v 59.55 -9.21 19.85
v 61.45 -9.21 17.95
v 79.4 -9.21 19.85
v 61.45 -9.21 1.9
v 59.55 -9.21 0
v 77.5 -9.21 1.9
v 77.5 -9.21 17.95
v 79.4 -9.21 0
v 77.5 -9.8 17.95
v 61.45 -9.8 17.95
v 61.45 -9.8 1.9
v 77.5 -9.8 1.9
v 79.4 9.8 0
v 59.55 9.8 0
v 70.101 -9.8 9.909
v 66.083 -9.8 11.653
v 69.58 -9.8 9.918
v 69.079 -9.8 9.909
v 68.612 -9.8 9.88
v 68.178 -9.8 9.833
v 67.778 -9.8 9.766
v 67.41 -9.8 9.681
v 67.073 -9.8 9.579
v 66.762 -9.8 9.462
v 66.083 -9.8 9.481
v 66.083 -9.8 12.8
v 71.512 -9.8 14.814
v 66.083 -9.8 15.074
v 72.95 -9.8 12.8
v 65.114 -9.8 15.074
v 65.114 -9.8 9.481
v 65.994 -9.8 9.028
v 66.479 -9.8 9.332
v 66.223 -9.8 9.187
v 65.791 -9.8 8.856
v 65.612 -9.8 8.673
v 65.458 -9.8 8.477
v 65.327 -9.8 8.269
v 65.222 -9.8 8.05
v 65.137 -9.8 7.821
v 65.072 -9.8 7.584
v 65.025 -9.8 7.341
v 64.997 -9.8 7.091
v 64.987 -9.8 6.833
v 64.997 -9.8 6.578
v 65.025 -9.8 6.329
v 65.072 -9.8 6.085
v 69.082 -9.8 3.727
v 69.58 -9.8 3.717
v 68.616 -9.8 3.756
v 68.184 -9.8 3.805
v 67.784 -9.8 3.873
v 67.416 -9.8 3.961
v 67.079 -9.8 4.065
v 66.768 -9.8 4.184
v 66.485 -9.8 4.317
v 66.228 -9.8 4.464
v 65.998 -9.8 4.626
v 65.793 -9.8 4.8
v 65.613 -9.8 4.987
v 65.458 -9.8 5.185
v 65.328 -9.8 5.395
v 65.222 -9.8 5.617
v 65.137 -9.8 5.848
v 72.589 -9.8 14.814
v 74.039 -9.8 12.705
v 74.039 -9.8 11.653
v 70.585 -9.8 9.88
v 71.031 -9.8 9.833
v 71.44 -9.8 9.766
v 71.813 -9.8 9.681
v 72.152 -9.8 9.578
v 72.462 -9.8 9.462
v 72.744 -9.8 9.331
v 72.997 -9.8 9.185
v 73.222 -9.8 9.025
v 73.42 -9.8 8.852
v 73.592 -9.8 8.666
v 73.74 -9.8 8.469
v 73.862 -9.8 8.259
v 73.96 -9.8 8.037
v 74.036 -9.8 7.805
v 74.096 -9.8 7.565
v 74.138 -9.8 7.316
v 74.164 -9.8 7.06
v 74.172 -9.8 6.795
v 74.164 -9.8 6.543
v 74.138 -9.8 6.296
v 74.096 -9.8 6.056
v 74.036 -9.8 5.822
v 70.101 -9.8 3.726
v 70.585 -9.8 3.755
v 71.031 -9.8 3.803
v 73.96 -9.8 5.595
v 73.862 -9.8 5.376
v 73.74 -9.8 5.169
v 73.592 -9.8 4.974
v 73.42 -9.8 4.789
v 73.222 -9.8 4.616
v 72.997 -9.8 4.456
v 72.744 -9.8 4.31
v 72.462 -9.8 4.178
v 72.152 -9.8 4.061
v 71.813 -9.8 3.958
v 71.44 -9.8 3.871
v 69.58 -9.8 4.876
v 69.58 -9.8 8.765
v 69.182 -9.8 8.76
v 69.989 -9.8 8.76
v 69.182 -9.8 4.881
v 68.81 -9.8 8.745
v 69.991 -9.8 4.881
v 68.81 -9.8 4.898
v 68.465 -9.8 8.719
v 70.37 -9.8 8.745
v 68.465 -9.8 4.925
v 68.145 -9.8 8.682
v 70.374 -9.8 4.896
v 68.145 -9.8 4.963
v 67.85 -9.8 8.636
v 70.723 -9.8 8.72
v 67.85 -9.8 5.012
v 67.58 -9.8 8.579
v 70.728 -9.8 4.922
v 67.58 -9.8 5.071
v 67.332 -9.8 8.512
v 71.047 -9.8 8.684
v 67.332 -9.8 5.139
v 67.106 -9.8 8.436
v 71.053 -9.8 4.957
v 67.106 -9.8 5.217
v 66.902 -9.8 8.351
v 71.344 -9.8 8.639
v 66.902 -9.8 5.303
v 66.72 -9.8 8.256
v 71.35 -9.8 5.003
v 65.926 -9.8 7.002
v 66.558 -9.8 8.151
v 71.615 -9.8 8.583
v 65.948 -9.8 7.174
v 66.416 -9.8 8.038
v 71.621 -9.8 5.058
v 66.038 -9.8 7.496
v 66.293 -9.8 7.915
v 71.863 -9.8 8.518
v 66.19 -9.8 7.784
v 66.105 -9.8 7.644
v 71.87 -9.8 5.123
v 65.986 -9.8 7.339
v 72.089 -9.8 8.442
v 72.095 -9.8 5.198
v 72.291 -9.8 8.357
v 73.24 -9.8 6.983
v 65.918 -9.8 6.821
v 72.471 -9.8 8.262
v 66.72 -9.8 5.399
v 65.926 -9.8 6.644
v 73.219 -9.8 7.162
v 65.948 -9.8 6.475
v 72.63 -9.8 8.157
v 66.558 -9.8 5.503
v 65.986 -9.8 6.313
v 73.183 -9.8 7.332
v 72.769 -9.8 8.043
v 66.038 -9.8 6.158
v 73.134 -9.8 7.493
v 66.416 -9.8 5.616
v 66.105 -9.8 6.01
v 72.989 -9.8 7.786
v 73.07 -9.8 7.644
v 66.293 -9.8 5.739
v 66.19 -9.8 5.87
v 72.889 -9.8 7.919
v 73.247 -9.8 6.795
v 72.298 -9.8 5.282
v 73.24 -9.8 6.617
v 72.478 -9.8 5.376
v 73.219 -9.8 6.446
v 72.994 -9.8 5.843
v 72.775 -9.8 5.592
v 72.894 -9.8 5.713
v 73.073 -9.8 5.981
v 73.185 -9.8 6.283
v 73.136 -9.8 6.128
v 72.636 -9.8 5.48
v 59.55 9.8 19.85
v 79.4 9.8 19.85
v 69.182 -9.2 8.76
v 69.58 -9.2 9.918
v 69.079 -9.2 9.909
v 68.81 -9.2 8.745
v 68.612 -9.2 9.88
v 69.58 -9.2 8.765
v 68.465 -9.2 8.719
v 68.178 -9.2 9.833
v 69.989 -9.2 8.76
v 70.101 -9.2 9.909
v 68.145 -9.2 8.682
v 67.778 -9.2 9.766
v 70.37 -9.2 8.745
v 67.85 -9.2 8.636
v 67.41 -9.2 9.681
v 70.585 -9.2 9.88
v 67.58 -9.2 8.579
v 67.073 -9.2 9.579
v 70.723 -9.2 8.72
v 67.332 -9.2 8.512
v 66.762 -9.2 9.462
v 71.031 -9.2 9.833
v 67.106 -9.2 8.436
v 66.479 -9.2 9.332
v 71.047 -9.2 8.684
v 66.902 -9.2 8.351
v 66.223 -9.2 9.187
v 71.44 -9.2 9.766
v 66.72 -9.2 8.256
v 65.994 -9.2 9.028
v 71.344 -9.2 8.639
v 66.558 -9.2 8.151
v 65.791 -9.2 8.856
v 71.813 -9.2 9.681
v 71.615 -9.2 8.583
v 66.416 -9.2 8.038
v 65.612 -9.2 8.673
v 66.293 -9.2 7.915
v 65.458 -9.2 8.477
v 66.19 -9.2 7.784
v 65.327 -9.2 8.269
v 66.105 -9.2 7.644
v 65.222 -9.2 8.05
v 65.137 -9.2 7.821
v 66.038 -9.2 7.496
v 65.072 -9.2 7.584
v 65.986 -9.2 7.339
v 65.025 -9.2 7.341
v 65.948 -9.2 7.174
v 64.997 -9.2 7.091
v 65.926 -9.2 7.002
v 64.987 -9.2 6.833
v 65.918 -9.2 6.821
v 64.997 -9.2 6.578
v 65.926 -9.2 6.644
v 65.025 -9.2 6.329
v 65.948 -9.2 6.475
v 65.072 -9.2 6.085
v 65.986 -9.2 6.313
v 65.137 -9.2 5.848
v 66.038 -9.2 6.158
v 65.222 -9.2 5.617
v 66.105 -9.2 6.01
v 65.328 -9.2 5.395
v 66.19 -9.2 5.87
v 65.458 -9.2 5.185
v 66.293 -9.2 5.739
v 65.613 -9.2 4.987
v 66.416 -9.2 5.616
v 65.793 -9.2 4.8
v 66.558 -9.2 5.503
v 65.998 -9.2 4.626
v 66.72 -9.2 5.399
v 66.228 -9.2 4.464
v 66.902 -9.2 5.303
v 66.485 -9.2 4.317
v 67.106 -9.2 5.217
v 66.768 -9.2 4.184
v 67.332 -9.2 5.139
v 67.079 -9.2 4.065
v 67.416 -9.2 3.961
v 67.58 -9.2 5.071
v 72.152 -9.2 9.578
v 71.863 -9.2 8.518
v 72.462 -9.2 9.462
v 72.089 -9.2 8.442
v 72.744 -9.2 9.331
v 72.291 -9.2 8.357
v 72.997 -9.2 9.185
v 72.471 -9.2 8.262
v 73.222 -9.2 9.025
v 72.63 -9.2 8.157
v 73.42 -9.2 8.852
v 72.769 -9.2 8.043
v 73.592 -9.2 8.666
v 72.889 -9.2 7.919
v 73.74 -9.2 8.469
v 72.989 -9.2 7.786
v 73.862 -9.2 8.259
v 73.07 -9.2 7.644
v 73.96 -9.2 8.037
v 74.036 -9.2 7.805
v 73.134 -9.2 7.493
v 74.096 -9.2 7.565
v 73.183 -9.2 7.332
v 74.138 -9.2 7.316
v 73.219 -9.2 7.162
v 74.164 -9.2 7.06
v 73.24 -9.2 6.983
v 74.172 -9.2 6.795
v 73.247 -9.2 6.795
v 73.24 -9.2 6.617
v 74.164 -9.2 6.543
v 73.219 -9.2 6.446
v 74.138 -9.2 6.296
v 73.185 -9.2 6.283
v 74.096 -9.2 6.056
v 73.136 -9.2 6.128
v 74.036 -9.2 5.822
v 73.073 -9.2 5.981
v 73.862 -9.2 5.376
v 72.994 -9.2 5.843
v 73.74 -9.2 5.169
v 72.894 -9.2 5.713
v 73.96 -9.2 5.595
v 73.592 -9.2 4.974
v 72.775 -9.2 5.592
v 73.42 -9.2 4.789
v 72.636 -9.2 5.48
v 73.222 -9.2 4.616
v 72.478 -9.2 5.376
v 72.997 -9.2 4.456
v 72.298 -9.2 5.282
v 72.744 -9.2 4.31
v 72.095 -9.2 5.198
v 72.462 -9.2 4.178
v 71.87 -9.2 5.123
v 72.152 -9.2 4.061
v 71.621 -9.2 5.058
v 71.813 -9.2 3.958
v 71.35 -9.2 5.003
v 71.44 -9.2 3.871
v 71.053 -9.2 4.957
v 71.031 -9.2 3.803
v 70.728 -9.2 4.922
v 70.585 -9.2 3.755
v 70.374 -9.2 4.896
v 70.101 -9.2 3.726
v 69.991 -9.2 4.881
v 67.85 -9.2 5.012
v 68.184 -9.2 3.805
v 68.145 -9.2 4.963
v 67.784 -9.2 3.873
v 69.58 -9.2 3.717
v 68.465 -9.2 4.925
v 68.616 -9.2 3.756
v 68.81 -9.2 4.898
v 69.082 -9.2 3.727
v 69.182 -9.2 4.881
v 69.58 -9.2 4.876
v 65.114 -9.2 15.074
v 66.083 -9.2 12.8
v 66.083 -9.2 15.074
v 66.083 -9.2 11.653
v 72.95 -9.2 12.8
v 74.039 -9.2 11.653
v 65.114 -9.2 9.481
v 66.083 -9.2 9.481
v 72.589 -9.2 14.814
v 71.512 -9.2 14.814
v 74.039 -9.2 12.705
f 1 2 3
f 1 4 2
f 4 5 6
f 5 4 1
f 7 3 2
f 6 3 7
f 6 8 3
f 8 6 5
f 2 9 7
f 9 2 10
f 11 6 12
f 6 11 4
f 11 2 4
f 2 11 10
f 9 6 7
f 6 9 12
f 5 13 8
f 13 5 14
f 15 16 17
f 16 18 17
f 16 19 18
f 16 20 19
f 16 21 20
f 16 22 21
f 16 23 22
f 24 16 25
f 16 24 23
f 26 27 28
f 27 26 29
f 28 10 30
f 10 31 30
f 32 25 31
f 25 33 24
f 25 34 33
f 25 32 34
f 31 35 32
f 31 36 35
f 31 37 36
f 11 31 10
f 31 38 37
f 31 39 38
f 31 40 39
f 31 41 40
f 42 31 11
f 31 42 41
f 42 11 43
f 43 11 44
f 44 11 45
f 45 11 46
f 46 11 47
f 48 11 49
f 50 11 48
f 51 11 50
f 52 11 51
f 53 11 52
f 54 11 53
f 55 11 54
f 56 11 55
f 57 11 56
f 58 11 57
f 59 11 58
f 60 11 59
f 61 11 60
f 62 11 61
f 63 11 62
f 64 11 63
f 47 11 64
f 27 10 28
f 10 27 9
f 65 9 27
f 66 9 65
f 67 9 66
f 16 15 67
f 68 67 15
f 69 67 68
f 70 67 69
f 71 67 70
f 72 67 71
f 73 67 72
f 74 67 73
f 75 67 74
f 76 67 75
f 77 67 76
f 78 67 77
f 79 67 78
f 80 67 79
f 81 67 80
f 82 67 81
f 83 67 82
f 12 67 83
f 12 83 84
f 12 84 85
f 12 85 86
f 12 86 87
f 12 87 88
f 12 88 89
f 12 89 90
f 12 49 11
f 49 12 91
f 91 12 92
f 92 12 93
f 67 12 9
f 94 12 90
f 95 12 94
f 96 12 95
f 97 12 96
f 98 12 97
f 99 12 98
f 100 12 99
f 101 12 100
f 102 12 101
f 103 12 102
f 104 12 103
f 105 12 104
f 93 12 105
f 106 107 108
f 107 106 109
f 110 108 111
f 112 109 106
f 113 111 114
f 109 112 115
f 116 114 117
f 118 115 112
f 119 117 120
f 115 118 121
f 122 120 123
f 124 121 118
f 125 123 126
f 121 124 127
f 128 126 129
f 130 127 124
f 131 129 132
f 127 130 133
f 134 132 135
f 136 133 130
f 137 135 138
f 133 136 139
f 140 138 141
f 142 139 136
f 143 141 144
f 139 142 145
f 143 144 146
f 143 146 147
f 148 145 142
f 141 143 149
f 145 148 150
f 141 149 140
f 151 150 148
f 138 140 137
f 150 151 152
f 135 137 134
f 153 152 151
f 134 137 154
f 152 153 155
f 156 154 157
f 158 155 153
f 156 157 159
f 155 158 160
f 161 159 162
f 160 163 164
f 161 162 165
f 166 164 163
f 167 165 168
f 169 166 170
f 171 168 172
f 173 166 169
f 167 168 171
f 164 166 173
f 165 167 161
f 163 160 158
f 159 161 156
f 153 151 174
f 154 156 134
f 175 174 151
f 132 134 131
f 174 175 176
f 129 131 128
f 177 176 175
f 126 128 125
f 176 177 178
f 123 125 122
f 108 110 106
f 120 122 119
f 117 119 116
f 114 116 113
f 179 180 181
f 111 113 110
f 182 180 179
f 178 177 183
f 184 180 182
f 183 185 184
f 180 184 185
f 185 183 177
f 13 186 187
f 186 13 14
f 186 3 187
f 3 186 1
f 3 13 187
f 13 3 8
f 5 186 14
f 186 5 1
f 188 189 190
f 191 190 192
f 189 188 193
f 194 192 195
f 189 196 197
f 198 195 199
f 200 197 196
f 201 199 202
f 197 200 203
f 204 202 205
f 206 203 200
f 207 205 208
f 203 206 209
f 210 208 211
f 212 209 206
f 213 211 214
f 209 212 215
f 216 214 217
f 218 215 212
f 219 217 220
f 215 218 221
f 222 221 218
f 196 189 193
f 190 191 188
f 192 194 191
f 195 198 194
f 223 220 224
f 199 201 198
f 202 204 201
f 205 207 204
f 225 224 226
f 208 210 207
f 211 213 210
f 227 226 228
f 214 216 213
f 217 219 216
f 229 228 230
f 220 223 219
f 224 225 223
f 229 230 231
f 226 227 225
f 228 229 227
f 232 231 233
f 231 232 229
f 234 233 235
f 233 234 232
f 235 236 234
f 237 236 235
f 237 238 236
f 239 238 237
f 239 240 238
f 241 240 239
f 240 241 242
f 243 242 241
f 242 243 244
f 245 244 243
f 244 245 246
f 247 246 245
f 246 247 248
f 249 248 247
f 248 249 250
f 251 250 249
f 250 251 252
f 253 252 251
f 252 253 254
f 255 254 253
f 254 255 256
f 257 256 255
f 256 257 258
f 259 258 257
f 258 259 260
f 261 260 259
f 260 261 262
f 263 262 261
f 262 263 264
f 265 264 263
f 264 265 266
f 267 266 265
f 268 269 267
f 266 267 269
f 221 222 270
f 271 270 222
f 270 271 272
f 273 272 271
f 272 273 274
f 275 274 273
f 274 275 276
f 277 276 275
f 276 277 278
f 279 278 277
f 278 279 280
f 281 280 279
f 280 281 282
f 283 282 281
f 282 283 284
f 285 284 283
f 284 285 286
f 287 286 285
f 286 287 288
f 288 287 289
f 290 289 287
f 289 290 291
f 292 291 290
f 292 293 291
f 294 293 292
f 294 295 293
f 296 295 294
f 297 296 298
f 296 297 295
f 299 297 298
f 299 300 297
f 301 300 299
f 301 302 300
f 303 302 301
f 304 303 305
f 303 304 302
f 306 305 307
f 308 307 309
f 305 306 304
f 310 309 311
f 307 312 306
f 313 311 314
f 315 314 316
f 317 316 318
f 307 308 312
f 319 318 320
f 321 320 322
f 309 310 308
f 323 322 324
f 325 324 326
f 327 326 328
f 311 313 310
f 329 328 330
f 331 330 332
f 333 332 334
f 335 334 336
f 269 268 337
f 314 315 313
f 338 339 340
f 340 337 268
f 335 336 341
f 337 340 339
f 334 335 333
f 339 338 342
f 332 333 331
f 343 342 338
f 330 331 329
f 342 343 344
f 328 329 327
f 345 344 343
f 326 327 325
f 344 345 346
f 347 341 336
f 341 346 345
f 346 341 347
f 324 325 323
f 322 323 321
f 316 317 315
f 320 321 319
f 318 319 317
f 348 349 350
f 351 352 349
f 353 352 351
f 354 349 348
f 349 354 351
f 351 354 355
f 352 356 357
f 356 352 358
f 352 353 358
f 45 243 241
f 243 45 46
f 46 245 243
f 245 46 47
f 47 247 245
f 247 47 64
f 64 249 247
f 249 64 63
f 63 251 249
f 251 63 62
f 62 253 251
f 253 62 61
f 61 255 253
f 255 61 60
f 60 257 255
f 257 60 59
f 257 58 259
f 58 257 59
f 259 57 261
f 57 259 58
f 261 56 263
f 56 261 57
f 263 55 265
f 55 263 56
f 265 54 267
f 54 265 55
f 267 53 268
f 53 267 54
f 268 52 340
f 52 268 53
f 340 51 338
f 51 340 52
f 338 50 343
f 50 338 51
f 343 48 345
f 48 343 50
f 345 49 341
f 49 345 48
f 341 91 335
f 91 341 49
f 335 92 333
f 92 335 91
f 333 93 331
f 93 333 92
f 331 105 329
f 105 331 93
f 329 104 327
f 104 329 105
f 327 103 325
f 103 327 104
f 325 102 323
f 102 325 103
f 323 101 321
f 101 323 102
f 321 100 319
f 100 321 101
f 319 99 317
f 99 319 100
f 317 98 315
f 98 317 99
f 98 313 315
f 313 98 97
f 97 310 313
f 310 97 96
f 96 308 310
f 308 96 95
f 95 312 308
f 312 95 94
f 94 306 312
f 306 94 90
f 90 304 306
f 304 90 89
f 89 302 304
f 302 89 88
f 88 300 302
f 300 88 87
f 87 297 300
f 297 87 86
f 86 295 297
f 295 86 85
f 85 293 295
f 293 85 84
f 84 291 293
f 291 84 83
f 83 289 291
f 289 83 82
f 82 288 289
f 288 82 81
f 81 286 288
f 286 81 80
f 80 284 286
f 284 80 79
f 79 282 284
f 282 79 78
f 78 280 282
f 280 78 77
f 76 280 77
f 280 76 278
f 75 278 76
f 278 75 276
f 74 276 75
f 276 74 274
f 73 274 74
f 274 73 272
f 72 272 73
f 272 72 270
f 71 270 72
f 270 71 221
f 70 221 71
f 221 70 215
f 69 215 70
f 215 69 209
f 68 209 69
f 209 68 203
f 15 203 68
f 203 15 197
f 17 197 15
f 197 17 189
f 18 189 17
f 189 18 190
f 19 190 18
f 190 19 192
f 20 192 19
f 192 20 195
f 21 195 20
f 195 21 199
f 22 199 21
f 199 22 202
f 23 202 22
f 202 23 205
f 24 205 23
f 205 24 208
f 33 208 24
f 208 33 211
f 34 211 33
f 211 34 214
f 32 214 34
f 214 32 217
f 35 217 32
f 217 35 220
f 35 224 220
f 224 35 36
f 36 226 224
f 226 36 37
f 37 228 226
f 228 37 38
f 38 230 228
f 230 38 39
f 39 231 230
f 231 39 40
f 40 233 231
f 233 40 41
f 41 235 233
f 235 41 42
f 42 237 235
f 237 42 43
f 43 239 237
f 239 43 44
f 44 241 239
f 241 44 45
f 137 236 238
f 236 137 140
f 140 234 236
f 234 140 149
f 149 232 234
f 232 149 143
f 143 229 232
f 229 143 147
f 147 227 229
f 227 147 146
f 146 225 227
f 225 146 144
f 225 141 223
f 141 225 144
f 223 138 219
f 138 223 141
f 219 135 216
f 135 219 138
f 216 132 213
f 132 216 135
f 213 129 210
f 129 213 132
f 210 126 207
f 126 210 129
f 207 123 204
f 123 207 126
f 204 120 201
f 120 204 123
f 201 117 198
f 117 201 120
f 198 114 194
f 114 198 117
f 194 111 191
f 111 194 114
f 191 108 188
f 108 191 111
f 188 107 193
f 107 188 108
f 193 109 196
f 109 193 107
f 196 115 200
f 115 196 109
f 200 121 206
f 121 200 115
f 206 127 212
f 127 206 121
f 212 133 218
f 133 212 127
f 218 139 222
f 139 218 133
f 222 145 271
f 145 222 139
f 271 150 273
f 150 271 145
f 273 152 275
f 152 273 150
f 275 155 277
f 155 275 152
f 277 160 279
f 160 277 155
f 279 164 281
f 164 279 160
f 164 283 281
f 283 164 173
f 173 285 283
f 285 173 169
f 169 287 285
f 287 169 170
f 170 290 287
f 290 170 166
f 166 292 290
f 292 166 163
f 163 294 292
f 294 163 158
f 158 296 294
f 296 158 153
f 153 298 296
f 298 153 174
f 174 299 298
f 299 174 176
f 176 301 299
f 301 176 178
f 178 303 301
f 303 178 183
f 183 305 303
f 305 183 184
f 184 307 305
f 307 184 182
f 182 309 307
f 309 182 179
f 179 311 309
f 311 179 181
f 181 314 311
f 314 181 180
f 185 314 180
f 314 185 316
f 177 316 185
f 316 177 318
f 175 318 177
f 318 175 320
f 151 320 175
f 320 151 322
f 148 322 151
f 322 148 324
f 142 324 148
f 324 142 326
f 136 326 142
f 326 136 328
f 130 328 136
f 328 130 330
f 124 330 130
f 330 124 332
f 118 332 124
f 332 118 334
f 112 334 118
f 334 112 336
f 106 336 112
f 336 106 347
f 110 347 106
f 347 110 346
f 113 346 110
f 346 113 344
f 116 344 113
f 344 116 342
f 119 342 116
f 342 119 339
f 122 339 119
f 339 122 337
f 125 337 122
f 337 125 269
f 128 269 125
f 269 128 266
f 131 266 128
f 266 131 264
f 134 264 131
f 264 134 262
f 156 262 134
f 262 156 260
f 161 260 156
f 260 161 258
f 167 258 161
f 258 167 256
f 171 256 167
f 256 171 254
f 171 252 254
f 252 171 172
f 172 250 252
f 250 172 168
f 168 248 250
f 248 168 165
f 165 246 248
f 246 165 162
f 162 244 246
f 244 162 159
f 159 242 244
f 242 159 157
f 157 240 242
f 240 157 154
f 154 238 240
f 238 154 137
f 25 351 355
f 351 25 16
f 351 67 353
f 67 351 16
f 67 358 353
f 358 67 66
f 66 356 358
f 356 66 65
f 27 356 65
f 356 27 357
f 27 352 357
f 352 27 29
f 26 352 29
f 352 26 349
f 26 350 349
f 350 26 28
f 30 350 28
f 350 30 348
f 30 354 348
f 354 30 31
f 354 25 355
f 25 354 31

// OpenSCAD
/*

  puzzle_part_10.scad

  Winston Freer Tile Puzzle: Part 10
      
  (c) olikraus@gmail.com

  This work is licensed under the Creative Commons Attribution-NonCommercial-ShareAlike 4.0 International License. 
  To view a copy of this license, visit http://creativecommons.org/licenses/by-nc-sa/4.0/.
    
*/

include <winston_freer.scad>;



translate([3*ts,0,0])
rotate([0,90,-90]) 
translate([-7*ts,-ts,0]) 
part10();
